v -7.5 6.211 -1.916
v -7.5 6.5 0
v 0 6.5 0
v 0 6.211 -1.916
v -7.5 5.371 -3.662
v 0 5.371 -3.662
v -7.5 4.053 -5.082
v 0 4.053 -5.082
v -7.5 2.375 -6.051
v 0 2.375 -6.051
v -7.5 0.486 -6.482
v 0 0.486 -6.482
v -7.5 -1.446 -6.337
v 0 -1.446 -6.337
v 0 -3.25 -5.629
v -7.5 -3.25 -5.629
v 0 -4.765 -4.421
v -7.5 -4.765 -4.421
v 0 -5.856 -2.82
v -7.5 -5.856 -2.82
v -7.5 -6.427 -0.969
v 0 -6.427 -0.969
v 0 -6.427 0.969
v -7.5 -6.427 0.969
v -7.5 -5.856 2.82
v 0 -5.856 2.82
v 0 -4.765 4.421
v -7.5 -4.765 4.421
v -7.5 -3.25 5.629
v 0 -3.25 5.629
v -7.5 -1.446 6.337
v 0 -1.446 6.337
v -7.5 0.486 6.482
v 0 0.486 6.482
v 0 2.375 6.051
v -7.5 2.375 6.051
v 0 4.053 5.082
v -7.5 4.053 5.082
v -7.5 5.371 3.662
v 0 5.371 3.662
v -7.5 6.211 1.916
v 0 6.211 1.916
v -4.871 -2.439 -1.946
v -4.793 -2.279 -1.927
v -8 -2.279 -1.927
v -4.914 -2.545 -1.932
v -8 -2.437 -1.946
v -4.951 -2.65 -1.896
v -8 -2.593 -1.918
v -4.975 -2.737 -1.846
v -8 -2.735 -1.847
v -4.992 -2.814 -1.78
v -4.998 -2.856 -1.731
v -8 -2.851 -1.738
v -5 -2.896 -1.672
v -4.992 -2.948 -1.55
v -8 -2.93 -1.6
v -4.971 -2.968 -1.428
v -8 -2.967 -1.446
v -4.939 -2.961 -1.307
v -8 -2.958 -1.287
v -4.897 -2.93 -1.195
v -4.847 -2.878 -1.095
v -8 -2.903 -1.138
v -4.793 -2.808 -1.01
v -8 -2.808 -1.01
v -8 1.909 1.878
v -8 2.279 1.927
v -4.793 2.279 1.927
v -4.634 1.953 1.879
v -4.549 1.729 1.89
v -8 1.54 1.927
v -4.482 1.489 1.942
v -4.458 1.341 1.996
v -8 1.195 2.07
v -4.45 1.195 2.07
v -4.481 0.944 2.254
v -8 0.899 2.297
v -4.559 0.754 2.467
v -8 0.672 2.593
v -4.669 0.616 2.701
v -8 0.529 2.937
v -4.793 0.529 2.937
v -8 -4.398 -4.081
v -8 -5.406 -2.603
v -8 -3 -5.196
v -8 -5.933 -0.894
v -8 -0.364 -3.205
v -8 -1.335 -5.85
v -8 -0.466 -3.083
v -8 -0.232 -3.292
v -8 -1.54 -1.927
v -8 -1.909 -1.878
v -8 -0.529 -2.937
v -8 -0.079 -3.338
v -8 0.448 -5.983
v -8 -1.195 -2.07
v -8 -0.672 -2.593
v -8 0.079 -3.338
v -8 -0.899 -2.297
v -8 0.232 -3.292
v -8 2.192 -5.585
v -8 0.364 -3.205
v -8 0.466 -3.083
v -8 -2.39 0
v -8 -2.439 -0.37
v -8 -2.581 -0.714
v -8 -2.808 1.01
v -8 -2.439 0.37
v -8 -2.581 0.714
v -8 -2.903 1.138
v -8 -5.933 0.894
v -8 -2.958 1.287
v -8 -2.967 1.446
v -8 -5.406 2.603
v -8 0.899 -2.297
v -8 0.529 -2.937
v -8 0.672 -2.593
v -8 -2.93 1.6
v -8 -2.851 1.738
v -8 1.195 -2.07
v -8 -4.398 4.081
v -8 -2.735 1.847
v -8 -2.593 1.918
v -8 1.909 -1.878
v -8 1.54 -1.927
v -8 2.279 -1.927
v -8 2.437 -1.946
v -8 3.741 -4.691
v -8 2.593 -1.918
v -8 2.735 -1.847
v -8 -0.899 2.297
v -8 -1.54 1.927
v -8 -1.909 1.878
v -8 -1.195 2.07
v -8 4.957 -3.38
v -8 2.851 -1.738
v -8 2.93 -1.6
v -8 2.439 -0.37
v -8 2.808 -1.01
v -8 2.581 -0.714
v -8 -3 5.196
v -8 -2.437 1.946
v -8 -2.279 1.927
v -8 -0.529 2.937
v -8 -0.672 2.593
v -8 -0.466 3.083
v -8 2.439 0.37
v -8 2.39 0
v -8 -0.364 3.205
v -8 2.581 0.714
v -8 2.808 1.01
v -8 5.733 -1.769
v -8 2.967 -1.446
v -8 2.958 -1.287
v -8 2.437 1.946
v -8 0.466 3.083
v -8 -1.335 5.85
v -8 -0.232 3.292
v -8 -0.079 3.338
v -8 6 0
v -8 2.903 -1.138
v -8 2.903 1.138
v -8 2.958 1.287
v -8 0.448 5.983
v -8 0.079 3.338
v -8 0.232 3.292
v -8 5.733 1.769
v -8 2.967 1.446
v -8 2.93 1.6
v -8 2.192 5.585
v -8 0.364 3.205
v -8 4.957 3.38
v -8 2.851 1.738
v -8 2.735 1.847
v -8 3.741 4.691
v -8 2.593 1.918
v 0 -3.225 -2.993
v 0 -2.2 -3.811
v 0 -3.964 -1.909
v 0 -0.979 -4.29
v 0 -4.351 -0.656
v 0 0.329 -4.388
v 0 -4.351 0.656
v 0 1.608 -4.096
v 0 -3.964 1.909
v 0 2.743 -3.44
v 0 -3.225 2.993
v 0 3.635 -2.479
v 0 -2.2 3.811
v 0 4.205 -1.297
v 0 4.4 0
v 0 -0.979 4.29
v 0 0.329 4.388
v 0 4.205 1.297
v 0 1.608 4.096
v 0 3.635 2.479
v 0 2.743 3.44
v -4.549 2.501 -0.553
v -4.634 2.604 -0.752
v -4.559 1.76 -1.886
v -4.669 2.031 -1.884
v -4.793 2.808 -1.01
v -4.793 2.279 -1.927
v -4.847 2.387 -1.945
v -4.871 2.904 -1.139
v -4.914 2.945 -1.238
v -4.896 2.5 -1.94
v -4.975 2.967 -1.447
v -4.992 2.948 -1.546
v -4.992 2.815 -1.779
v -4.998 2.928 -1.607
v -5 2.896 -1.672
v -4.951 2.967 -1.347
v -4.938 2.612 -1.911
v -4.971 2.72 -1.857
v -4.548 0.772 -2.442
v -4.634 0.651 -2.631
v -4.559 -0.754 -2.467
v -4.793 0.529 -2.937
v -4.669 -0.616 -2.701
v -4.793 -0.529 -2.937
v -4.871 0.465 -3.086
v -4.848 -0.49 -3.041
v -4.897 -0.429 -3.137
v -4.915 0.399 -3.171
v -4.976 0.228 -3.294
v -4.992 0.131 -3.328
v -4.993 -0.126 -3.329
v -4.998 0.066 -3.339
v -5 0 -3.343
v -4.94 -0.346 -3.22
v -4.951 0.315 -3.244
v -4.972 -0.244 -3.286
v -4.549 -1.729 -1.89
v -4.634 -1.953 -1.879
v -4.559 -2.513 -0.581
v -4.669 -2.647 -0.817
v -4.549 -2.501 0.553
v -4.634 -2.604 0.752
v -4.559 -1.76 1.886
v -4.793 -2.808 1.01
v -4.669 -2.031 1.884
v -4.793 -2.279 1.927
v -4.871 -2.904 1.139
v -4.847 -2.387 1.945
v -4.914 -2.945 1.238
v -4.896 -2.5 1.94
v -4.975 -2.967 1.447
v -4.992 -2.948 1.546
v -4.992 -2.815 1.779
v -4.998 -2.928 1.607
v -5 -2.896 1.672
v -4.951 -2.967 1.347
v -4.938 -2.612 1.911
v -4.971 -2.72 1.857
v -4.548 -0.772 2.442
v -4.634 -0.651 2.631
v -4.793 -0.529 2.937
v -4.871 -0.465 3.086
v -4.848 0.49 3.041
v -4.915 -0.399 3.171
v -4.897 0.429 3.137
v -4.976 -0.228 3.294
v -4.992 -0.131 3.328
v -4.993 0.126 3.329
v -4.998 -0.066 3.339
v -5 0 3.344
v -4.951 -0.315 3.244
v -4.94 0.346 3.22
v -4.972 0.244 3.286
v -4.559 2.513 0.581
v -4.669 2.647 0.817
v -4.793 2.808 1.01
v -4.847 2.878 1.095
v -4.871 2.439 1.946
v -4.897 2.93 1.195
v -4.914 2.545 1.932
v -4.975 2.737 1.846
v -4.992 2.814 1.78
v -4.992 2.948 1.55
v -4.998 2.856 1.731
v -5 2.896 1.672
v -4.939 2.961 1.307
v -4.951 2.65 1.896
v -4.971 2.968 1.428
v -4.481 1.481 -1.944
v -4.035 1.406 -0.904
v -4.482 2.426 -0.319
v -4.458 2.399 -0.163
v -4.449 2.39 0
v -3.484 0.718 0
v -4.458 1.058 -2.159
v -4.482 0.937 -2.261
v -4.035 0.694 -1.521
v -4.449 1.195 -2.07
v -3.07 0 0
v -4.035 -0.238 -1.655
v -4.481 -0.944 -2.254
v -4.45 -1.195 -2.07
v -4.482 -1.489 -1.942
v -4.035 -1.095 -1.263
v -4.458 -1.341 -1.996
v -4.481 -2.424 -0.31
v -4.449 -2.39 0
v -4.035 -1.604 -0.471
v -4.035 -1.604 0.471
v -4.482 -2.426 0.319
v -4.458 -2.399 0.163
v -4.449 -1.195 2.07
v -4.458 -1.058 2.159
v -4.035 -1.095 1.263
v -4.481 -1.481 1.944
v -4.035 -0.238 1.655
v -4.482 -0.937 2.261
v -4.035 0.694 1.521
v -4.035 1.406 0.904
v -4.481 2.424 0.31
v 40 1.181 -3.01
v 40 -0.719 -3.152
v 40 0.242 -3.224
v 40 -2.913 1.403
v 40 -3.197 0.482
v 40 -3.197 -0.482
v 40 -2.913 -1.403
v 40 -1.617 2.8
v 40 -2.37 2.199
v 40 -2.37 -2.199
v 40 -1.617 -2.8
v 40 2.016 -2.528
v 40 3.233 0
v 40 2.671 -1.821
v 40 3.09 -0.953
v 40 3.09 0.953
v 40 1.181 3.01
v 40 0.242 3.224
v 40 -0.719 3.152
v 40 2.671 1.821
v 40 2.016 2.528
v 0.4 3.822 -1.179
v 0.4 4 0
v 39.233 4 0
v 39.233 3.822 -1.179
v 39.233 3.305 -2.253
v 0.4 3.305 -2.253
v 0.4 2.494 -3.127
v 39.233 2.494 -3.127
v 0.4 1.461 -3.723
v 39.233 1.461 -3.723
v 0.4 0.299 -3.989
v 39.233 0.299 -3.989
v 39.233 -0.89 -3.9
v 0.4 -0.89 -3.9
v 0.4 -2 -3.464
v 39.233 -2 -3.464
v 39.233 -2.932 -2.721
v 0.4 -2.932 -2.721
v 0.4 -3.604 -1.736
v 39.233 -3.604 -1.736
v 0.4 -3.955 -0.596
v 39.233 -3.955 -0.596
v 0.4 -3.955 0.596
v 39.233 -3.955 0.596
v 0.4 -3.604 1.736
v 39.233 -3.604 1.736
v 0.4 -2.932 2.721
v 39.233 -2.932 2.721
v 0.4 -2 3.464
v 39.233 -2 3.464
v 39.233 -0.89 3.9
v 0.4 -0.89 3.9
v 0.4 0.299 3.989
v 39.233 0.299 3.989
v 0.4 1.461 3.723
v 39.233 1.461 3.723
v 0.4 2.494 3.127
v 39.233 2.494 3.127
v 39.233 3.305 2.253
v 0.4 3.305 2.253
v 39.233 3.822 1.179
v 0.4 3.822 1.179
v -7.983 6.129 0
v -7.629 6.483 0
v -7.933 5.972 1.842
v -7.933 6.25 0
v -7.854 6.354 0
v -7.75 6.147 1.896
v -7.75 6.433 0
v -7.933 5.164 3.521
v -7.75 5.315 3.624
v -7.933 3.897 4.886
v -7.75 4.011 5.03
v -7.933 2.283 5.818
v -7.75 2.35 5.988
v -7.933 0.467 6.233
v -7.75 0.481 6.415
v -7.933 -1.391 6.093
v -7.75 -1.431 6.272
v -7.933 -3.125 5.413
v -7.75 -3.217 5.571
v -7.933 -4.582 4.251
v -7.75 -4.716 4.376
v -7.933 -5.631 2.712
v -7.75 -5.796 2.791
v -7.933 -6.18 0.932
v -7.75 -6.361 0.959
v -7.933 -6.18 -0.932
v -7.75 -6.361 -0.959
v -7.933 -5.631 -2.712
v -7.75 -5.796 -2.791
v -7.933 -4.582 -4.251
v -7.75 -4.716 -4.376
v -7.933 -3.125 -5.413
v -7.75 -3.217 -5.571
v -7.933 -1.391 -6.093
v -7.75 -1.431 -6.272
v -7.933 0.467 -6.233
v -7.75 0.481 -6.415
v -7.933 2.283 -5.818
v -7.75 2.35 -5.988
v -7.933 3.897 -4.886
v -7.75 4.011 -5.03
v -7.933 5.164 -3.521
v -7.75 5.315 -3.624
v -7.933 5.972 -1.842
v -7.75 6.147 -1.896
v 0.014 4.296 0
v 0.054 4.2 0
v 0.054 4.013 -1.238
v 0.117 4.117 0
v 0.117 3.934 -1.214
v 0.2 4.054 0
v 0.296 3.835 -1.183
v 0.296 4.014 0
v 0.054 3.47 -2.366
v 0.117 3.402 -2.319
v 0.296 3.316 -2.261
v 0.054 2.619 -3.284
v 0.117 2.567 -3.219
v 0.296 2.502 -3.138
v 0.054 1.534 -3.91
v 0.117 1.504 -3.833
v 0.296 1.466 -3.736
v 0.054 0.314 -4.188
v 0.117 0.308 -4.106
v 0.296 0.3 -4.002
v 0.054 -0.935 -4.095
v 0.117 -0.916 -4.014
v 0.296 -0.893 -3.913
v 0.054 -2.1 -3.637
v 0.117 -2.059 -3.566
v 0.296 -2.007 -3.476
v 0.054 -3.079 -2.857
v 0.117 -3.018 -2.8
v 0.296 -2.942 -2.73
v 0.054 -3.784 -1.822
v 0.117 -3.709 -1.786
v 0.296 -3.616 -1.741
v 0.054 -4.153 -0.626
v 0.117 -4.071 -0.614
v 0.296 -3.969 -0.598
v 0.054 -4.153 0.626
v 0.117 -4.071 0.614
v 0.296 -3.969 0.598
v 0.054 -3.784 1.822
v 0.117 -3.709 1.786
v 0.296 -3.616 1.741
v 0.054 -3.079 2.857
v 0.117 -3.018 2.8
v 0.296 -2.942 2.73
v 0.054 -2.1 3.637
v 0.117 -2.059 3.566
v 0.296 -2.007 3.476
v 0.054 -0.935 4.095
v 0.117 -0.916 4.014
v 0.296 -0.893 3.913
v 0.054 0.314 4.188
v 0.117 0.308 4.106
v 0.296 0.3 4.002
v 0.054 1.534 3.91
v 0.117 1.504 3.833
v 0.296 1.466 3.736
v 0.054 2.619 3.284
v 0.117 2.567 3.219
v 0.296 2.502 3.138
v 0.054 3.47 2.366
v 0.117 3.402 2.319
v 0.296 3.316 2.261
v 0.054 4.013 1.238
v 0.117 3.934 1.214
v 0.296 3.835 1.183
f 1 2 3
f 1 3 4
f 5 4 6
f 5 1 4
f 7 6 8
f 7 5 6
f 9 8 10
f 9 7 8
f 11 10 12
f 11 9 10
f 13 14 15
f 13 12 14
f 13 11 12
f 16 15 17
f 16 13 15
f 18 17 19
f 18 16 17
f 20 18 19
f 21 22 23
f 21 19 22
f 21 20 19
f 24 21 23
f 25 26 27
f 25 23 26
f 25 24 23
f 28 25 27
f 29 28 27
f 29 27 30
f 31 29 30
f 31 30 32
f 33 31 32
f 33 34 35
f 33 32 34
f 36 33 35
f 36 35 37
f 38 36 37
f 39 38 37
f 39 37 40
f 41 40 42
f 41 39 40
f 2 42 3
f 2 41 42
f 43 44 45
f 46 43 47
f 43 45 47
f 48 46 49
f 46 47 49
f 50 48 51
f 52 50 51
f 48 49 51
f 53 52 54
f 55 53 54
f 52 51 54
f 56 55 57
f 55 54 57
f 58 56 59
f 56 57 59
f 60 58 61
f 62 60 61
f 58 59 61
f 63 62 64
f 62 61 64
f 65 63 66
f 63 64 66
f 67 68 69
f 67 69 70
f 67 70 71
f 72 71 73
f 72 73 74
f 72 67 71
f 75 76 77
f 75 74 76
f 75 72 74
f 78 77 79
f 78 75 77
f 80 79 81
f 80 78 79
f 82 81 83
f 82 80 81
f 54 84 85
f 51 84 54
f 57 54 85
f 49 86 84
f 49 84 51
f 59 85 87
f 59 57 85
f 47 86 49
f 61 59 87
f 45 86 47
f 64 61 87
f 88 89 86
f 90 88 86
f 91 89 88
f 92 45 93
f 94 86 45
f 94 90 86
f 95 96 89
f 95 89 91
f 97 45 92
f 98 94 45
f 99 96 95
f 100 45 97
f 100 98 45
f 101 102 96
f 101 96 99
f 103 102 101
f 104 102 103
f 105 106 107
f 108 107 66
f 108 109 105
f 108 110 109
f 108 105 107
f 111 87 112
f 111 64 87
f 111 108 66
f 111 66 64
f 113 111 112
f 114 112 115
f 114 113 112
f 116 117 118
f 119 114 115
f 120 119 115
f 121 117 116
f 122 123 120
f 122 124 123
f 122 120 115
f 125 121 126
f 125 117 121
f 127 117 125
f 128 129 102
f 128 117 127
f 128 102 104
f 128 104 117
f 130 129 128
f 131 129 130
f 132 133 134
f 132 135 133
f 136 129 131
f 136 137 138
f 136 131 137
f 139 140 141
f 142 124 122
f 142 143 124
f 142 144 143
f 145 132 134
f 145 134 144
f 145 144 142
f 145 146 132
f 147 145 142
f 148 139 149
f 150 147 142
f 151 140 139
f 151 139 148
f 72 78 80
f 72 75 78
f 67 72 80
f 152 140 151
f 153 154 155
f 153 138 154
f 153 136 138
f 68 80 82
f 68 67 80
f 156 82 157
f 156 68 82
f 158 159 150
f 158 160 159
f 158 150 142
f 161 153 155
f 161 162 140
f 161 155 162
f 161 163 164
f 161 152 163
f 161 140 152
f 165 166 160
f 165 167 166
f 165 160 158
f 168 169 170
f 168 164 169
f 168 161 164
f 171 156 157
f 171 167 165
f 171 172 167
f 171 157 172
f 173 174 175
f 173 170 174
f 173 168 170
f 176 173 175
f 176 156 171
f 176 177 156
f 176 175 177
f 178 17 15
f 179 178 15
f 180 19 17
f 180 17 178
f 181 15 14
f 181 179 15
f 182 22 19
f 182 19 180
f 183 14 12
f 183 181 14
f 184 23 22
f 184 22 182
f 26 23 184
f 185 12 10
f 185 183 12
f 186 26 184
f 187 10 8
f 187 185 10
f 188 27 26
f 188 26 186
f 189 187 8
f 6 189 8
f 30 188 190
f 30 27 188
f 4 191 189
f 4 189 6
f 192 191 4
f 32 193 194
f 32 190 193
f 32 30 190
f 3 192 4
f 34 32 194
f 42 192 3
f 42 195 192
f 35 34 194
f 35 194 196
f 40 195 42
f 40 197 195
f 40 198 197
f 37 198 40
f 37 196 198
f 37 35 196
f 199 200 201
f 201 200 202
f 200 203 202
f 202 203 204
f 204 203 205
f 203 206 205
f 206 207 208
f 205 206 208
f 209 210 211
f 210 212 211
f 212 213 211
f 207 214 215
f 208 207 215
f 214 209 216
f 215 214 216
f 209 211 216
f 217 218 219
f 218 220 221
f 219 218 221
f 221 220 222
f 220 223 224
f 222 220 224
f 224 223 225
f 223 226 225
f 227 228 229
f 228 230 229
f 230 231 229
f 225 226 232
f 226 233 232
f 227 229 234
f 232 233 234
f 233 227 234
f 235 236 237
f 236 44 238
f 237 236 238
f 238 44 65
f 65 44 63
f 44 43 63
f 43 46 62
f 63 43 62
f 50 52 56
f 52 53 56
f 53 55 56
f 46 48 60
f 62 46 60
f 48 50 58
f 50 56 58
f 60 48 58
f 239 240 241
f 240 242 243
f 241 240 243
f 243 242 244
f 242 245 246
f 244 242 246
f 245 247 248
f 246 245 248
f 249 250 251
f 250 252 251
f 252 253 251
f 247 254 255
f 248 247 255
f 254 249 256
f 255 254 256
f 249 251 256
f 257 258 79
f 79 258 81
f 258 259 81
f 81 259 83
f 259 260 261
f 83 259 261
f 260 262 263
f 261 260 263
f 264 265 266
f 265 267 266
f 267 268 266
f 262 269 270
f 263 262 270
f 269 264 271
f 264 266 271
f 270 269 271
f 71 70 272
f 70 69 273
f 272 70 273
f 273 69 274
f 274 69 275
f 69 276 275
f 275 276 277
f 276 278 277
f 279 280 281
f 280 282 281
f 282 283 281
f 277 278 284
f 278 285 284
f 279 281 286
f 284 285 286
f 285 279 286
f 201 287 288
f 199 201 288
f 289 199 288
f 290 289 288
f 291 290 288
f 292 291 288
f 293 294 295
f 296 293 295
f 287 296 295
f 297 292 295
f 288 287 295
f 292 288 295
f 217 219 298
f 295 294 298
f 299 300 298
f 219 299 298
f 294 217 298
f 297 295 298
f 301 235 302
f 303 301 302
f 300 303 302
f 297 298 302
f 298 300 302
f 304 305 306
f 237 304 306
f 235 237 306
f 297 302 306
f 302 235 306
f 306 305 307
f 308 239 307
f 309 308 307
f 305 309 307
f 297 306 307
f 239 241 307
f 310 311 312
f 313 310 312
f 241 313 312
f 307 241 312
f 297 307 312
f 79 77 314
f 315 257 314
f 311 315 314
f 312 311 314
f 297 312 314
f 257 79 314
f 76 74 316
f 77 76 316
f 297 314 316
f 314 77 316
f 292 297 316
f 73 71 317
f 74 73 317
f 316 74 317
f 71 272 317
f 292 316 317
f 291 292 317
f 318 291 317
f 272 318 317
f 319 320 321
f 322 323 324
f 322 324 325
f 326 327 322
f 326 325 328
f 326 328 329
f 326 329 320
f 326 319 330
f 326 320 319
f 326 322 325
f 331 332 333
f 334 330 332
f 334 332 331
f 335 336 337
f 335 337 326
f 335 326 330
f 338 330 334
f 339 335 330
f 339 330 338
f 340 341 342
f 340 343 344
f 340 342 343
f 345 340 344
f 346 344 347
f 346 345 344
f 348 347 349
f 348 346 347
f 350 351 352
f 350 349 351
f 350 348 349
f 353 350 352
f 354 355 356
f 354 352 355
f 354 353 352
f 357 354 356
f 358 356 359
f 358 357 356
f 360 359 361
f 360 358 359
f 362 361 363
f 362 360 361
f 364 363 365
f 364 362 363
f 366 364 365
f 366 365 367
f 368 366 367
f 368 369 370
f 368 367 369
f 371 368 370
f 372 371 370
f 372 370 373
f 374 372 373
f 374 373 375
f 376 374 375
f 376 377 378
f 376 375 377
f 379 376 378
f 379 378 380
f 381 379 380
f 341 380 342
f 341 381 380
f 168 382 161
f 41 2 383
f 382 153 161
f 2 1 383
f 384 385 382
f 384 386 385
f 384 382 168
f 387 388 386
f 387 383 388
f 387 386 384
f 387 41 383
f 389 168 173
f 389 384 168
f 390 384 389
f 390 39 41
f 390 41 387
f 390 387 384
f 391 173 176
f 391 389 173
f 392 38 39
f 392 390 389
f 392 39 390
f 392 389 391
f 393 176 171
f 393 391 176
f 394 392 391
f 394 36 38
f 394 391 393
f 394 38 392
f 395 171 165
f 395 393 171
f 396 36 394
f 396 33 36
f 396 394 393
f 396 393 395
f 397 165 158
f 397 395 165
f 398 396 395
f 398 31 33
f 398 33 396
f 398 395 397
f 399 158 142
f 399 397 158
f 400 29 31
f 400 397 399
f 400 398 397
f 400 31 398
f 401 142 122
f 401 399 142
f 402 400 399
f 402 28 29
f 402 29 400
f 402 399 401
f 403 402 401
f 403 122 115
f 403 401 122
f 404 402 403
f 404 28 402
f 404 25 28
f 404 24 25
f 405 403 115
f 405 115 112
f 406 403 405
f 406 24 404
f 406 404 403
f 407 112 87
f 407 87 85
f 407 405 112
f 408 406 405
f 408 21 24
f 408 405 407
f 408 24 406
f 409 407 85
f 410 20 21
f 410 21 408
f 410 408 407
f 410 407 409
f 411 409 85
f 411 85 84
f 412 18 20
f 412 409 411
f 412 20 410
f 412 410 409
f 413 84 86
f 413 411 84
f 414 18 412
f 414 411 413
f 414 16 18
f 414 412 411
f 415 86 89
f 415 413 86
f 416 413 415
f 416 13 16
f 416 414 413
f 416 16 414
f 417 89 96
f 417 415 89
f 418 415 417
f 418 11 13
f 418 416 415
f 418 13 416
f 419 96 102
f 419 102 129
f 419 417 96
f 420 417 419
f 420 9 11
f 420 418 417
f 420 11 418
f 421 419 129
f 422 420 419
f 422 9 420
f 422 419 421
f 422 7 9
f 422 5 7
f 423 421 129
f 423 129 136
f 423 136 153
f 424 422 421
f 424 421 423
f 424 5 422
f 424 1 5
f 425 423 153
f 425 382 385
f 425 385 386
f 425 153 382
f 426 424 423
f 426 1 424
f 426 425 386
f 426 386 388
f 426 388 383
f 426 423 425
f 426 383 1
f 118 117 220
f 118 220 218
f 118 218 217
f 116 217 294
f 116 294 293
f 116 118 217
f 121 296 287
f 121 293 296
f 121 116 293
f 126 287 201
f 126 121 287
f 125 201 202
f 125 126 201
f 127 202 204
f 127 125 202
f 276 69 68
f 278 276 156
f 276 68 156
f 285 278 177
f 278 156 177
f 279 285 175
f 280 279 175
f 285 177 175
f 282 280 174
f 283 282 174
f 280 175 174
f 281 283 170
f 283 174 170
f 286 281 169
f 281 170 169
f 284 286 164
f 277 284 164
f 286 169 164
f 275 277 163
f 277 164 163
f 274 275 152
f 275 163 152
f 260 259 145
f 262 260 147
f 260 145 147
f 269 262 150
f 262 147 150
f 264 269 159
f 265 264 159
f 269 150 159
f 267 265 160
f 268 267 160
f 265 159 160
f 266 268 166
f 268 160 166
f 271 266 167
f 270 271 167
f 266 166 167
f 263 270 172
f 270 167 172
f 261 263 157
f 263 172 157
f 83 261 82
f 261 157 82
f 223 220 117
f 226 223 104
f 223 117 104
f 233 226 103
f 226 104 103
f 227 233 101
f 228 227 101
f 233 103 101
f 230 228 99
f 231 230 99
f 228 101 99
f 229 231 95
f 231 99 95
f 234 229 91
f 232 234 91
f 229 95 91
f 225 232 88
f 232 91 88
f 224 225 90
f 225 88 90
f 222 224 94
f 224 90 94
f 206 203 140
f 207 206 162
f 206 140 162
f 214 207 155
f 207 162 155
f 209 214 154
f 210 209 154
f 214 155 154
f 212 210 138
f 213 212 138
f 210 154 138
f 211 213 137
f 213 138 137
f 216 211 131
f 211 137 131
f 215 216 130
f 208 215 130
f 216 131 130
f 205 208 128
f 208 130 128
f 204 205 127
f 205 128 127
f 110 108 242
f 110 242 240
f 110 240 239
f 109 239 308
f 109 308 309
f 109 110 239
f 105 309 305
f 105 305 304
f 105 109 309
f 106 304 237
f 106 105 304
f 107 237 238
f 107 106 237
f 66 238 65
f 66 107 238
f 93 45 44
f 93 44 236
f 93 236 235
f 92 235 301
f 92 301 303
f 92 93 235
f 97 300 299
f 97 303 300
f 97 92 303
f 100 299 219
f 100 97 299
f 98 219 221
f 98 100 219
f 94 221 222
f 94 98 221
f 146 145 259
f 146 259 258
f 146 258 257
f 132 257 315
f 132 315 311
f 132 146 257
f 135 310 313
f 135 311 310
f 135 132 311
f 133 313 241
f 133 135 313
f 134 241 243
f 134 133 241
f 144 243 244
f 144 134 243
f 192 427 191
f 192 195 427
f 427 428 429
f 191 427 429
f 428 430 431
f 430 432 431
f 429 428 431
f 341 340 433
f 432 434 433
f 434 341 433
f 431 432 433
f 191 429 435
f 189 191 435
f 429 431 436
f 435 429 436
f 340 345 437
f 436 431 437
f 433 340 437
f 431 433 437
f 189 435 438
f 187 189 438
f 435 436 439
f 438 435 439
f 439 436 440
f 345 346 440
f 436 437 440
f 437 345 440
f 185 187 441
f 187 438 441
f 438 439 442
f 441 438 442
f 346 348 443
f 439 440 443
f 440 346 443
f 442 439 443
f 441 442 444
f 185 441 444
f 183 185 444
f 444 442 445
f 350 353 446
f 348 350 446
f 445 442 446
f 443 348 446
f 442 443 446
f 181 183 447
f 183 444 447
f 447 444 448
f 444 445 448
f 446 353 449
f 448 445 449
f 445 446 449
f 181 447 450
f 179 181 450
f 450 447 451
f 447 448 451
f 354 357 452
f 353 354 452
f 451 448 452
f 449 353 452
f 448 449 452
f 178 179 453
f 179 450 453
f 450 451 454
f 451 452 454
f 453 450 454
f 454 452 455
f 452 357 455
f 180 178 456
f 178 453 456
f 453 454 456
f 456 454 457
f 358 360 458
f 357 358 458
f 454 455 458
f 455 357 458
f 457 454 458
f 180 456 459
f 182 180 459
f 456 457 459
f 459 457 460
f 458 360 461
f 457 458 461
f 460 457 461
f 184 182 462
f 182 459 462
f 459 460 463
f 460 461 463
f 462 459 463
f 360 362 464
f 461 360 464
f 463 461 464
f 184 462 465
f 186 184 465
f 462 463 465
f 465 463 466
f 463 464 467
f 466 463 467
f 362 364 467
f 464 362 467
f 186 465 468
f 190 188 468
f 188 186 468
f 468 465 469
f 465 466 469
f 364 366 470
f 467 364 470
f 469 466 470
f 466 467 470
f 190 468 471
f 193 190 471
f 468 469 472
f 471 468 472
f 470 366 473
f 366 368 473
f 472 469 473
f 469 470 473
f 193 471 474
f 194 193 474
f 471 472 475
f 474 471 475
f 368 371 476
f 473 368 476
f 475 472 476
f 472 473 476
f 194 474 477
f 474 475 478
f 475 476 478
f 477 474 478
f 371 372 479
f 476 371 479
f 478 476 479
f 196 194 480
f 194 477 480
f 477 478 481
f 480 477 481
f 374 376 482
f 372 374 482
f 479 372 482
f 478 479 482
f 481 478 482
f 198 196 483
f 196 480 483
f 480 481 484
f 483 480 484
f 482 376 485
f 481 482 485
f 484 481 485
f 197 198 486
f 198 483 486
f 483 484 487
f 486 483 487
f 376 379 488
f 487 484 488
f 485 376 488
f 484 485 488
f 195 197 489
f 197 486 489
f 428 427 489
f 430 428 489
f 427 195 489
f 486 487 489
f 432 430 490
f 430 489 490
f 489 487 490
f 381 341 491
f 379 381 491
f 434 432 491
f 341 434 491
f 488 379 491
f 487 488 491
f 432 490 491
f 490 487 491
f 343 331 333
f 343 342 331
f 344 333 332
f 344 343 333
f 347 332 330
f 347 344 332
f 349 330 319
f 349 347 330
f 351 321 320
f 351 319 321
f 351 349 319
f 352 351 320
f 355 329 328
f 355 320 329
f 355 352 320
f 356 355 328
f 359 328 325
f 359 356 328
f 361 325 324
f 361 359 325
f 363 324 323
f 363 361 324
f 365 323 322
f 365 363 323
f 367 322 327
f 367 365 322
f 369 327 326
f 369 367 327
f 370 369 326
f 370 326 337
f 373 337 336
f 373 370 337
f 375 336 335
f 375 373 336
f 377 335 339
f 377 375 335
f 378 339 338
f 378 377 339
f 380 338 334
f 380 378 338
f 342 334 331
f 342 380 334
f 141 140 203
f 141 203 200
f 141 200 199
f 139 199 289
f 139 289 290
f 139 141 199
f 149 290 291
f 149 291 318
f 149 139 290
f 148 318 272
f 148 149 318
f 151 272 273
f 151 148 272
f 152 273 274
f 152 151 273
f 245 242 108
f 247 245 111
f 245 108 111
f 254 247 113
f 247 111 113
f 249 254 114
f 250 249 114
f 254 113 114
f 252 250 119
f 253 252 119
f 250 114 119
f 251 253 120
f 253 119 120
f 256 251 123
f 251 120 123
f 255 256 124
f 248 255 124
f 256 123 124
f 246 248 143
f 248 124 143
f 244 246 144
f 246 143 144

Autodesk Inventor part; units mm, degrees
ref_plane "YZ Plane" through (0, 0, 0) normal (1, 0, 0) x (0, 1, 0)
ref_plane "XZ Plane" through (0, 0, 0) normal (0, 1, 0) x (-1, 0, 0)
sketch "Sketch1" plane through (0, 0, 0) normal (0, 0, 1) x (1, 0, 0)
  line L0 (-3.0696, 0) -> (40, 0)
  line L1 (40, 0) -> (40, 4)
  line L2 (40, 4) -> (12, 4)
  line L3 (12, 4) -> (11.2332, 4)
  line L4 (11.2332, 4) -> (0.4, 4)
  line L5 (0, 4.4) -> (0, 6.5)
  line L6 (0, 6.5) -> (-8, 6.5)
  line L7 (-8, 6.5) -> (-8, 3.3435)
  line L8 (-8, 3.3435) -> (-5, 3.3435)
  line L9 (-5, 3.3435) -> (-3.0696, 0)
  line L10 (-17.6, 0) -> (49.6, 0) projected
  line L11 (0, -1.3) -> (0, 7.8) projected
  line L12 (12, 4) -> (0, 4) construction
  arc A0 (0, 4.4) -> (0.4, 4) centre (0.4, 4.4) ccw
  point P0 (0, 4)
  dimension "d1" = 28
  dimension "d2" = 0.7668
  dimension "d3" = 8
  dimension "d4" = 3
  dimension "d5" = 60
  dimension "d6" = 8
  dimension "d7" = 8
  dimension "d8" = 6.687
  dimension "d9" = 13
  dimension "d20" = 40
  dimension "d34" = 0.4
revolve "Body" add sketch "Sketch1" angle 360 about axis through (-3.0696, 0, 0) along (1, 0, 0)
sketch "Sketch2" plane through (-8, 0, 0) normal (-1, 0, 0) x (0, 0, 1)
  line L0 (0, -9.1) -> (0, 9.1) projected
  line L1 (-9.1, 0) -> (9.1, 0) projected
  circle A0 centre (0, 0) radius 3.3435 projected
  circle A1 centre (0, 0) radius 2.39
  line L2 (0, 0) -> (5.8463, 3.3754) construction
  line L3 (0, 0) -> (2.9613, 5.1292) construction
  arc A2 (1.9271, 2.2791) -> (1.0103, 2.8085) centre (1.3978, 2.421) ccw
  arc A3 (2.9373, -0.5293) -> (2.9373, 0.5293) centre (2.7955, 0) ccw
  arc A4 (1.9271, 2.2791) -> (2.9373, 0.5293) centre (3.3071, 1.9094) ccw
  arc A5 (-1.0103, 2.8085) -> (-1.9271, 2.2791) centre (-1.3978, 2.421) ccw
  arc A6 (-2.9373, 0.5293) -> (-2.9373, -0.5293) centre (-2.7955, 0) ccw
  arc A7 (-2.9373, 0.5293) -> (-1.9271, 2.2791) centre (-3.3071, 1.9094) ccw
  arc A8 (-1.9271, -2.2791) -> (-1.0103, -2.8085) centre (-1.3978, -2.421) ccw
  arc A9 (-1.9271, -2.2791) -> (-2.9373, -0.5293) centre (-3.3071, -1.9094) ccw
  arc A10 (-2.9373, 0.5293) -> (-2.9373, -0.5293) centre (-2.7955, 0) ccw
  arc A11 (1.0103, -2.8085) -> (1.9271, -2.2791) centre (1.3978, -2.421) ccw
  arc A12 (2.9373, -0.5293) -> (2.9373, 0.5293) centre (2.7955, 0) ccw
  arc A13 (2.9373, -0.5293) -> (1.9271, -2.2791) centre (3.3071, -1.9094) ccw
  arc A14 (-1.0103, 2.8085) -> (1.0103, 2.8085) centre (0, 3.8187) ccw
  arc A15 (1.0103, -2.8085) -> (-1.0103, -2.8085) centre (0, -3.8187) ccw
  dimension "d35" = 4.78
  dimension "d36" = 30
  dimension "d37" = 60
  dimension "d38" = 0.548
extrude "Slot" add sketch "Sketch2" against normal up to next contours A0 A8 A15 L0 | L0 A15 A11 A0 | A0 A6 A9 A8 | A11 A13 A3 A0 | A0 A5 A7 A6 | A3 A4 A2 A0 | A14 A5 A0 L0 | L0 A0 A2 A14
fillet "Fillet1" radius 0.5 1 edges at (-8, -6.5, 0)
thread "Thread" size "M8x1.25" designation "M8" class "6g" standard "GB Metric profile" length 28
chamfer "Chamfer1" distance 0.7668 distance2 0.7669 1 edges at (40, -4, 0) measured on face at (40, -0.998, -0.8842)
ref_plane "Work Plane1" through (0, 0, 0) normal (0, 0.5, 0.866) x (1, 0, 0)
equation "\"d1\" = GEL"
equation "\"d2\" = GAL"
equation "\"d3\" = KOH"
equation "\"d4\" = INTI"
equation "\"d6\" = GD"
equation "\"d7\" = BDM"
equation "\"d8\" = E0"
equation "\"d9\" = KOD"
equation "\"d20\" = NLG"
equation "\"d34\" = R"
equation "\"d35\" = SW"
equation "\"d38\" = RRK"
equation "\"d17\" = RR"
equation "\"d13\" = GEL"
equation "\"d15\" = -0.5 * SPD + 0.5 * GD"
equation "\"GD\" = NND"
equation "\"NLG\" = 40"
equation "\"GEL\" = 28"
equation "\"KOD\" = 13"
equation "\"KOH\" = 8"
equation "\"INTI\" = 3"
equation "\"GAL\" = 0.61345 * PTC"
equation "\"GUL\" = 0.61345 * PTC"
equation "\"BDM\" = NND"
equation "\"SW\" = 4.78"
equation "\"RR\" = 0.5"
equation "\"SPD\" = NND - 1.2269 * PTC"
equation "\"R\" = 0.4"
equation "\"E0\" = 6.687"
equation "\"RRK\" = 0.548"
equation "\"TOA\" = 30deg"
equation "\"GD1\" = THREADDIA - 1.2269 * PTC"
equation "\"THREADDIA\" = 8"
equation "\"FAWI\" = 45deg"
equation "\"ANG\" = 120deg"
equation "\"PTC\" = 1.25"
equation "\"NND\" = 8"
equation "\"KEWI\" = 5deg"
properties part number "Screw GB/T 2171.2 M8 x 40" material "Acciaio, Dolce"
